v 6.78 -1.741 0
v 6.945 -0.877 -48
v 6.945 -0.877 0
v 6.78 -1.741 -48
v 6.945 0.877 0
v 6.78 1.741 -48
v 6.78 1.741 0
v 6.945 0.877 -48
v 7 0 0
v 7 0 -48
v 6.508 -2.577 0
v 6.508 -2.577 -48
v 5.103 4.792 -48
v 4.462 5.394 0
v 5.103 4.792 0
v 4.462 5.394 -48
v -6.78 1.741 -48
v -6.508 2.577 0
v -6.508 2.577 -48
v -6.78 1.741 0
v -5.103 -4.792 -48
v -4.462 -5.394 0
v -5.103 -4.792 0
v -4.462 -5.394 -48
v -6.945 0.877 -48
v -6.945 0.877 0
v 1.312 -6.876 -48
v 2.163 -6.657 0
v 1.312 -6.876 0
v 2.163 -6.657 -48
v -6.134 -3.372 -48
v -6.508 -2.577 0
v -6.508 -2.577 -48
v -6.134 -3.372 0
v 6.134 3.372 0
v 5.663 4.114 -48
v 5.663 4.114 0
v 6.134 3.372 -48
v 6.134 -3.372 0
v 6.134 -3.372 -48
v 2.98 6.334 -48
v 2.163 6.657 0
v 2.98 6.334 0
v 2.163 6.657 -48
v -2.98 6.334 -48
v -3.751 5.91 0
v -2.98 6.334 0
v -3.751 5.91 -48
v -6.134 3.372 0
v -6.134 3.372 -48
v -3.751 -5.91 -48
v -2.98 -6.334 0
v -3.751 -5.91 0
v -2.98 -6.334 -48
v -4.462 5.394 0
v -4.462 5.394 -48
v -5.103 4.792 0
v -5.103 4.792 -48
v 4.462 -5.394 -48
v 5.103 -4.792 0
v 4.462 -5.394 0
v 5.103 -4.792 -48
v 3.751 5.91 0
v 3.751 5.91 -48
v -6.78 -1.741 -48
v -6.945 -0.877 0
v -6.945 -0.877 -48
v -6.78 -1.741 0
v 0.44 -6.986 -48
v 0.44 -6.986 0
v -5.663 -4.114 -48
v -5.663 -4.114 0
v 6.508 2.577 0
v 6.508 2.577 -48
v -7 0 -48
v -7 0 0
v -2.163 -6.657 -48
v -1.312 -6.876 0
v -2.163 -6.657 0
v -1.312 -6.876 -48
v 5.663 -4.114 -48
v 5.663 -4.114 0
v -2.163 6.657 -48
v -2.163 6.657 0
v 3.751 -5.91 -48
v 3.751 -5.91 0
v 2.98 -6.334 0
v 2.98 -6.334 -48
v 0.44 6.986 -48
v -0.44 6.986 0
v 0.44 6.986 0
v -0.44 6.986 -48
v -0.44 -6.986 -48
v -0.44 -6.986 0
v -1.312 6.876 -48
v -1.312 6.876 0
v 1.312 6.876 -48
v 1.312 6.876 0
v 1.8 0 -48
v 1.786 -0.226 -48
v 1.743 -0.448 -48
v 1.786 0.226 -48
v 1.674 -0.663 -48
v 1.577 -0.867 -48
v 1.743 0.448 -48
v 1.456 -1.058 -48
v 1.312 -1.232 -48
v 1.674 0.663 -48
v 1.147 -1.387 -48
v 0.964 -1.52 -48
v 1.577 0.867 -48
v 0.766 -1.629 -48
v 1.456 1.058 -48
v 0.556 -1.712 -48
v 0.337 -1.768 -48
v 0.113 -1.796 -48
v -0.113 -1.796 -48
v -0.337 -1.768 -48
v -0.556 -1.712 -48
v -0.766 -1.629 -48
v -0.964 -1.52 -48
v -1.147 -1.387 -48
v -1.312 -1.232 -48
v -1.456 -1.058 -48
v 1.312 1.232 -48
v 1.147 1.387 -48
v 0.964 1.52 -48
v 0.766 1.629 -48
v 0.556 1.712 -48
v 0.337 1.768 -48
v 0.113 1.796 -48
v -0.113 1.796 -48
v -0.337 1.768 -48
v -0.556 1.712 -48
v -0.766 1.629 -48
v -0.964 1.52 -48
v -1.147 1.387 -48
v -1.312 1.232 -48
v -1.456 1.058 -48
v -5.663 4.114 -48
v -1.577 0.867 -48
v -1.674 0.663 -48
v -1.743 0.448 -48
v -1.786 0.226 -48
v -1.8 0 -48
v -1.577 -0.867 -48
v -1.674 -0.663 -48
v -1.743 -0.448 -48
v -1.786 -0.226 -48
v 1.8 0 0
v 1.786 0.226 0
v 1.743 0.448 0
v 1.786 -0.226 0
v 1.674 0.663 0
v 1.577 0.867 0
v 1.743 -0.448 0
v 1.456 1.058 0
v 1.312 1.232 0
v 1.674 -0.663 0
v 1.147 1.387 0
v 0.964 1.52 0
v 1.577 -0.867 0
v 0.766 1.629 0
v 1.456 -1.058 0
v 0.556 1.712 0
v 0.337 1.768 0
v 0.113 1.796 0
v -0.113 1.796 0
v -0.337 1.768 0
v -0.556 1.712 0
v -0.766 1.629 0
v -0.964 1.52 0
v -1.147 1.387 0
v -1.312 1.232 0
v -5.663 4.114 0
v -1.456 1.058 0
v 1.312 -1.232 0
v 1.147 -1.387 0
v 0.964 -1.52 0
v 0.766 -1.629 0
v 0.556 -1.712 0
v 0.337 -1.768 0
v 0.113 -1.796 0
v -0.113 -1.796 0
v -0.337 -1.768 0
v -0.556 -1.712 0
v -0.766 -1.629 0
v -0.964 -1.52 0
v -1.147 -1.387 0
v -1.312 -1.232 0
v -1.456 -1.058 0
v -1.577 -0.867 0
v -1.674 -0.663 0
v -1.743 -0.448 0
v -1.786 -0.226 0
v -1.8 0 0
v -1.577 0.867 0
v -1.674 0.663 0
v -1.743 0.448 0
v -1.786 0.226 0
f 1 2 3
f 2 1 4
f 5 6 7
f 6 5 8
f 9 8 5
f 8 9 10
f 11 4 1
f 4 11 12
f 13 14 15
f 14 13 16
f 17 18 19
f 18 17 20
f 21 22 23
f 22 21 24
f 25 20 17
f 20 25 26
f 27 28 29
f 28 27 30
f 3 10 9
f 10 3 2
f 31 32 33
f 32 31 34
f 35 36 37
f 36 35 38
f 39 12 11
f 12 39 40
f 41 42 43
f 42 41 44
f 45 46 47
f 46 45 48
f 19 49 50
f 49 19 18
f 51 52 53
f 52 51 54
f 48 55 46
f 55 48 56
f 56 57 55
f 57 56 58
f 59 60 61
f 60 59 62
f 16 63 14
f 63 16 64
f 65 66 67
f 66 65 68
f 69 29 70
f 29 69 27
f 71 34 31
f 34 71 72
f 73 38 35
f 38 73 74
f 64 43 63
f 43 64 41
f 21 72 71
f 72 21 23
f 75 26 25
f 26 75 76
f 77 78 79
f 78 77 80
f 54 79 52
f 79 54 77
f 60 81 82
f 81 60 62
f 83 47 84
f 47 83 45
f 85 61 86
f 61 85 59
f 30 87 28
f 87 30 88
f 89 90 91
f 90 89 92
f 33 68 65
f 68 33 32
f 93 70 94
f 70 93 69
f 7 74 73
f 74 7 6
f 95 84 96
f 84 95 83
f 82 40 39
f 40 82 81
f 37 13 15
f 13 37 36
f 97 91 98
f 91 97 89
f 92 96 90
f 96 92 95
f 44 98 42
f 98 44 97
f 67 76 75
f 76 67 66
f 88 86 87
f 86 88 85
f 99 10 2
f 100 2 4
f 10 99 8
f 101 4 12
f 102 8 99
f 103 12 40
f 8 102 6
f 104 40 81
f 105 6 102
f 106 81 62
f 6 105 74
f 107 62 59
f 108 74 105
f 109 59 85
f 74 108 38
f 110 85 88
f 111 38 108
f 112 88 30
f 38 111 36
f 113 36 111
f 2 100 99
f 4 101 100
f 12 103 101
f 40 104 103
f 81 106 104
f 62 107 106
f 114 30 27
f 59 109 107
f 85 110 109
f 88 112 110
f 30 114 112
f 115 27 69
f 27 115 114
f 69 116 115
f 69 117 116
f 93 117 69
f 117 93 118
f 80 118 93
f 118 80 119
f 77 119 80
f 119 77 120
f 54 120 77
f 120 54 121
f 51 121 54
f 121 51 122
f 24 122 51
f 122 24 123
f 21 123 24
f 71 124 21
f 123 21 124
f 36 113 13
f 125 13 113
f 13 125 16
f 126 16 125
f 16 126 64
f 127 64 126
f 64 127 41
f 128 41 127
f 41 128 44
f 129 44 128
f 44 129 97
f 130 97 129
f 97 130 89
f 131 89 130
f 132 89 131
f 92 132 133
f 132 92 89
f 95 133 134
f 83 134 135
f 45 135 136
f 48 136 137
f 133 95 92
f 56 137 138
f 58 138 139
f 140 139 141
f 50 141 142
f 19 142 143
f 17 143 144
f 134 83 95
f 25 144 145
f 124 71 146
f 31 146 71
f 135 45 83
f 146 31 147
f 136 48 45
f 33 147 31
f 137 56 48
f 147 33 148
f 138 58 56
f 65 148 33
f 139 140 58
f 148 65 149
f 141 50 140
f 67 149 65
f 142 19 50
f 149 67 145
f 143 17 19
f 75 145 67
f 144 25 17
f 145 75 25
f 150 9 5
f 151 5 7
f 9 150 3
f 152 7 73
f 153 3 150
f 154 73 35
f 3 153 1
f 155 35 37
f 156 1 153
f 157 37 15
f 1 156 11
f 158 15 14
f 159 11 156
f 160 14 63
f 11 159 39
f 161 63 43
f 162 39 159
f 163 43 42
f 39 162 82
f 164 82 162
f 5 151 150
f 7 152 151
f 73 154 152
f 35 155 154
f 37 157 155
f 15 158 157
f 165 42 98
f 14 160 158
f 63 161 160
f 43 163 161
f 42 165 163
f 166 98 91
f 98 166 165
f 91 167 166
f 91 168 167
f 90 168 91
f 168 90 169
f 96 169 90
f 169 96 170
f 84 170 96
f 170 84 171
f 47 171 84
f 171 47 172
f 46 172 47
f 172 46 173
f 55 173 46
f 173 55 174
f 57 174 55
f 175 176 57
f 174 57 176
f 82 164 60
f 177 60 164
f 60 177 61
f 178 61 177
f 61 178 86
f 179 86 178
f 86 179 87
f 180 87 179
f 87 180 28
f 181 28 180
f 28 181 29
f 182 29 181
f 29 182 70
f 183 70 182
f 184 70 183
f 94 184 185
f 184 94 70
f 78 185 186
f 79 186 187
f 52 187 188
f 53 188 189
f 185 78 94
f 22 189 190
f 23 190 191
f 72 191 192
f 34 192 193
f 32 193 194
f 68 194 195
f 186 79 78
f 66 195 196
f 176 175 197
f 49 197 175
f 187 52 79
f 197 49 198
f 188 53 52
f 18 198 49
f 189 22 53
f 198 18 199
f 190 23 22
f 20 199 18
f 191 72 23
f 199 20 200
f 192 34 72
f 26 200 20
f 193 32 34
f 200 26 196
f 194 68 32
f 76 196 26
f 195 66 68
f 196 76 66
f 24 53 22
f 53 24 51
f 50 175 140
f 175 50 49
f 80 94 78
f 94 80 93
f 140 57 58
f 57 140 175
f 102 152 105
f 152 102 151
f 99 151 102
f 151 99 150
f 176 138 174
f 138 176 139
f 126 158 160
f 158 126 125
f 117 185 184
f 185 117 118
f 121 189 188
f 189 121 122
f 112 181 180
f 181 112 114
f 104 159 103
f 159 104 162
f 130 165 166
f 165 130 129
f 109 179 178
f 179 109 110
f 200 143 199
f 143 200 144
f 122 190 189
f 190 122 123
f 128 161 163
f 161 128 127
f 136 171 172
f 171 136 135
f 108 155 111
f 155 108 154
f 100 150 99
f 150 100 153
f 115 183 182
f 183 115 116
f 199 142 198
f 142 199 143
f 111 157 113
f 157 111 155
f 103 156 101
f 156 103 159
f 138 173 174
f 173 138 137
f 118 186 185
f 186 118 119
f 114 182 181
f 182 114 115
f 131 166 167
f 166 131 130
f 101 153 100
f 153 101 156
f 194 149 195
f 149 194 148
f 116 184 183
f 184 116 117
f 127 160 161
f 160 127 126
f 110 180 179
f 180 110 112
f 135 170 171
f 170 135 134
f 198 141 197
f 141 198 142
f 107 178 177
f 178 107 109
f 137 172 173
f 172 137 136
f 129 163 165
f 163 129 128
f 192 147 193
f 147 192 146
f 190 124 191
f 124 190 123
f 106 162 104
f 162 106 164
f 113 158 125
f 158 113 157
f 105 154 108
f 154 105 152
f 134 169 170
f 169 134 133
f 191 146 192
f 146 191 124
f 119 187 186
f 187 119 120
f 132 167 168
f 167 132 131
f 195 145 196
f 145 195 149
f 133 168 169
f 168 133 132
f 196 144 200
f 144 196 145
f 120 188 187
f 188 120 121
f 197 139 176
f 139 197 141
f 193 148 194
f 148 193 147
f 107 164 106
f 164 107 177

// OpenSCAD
$fn = 50;


difference() {
	union() {
		translate(v = [0, 0, -48.0000000000]) {
			cylinder(h = 48, r = 7.0000000000);
		}
	}
	union() {
		#translate(v = [0, 0, -48]) {
			cylinder(h = 48, r = 1.8000000000);
		}
	}
}
